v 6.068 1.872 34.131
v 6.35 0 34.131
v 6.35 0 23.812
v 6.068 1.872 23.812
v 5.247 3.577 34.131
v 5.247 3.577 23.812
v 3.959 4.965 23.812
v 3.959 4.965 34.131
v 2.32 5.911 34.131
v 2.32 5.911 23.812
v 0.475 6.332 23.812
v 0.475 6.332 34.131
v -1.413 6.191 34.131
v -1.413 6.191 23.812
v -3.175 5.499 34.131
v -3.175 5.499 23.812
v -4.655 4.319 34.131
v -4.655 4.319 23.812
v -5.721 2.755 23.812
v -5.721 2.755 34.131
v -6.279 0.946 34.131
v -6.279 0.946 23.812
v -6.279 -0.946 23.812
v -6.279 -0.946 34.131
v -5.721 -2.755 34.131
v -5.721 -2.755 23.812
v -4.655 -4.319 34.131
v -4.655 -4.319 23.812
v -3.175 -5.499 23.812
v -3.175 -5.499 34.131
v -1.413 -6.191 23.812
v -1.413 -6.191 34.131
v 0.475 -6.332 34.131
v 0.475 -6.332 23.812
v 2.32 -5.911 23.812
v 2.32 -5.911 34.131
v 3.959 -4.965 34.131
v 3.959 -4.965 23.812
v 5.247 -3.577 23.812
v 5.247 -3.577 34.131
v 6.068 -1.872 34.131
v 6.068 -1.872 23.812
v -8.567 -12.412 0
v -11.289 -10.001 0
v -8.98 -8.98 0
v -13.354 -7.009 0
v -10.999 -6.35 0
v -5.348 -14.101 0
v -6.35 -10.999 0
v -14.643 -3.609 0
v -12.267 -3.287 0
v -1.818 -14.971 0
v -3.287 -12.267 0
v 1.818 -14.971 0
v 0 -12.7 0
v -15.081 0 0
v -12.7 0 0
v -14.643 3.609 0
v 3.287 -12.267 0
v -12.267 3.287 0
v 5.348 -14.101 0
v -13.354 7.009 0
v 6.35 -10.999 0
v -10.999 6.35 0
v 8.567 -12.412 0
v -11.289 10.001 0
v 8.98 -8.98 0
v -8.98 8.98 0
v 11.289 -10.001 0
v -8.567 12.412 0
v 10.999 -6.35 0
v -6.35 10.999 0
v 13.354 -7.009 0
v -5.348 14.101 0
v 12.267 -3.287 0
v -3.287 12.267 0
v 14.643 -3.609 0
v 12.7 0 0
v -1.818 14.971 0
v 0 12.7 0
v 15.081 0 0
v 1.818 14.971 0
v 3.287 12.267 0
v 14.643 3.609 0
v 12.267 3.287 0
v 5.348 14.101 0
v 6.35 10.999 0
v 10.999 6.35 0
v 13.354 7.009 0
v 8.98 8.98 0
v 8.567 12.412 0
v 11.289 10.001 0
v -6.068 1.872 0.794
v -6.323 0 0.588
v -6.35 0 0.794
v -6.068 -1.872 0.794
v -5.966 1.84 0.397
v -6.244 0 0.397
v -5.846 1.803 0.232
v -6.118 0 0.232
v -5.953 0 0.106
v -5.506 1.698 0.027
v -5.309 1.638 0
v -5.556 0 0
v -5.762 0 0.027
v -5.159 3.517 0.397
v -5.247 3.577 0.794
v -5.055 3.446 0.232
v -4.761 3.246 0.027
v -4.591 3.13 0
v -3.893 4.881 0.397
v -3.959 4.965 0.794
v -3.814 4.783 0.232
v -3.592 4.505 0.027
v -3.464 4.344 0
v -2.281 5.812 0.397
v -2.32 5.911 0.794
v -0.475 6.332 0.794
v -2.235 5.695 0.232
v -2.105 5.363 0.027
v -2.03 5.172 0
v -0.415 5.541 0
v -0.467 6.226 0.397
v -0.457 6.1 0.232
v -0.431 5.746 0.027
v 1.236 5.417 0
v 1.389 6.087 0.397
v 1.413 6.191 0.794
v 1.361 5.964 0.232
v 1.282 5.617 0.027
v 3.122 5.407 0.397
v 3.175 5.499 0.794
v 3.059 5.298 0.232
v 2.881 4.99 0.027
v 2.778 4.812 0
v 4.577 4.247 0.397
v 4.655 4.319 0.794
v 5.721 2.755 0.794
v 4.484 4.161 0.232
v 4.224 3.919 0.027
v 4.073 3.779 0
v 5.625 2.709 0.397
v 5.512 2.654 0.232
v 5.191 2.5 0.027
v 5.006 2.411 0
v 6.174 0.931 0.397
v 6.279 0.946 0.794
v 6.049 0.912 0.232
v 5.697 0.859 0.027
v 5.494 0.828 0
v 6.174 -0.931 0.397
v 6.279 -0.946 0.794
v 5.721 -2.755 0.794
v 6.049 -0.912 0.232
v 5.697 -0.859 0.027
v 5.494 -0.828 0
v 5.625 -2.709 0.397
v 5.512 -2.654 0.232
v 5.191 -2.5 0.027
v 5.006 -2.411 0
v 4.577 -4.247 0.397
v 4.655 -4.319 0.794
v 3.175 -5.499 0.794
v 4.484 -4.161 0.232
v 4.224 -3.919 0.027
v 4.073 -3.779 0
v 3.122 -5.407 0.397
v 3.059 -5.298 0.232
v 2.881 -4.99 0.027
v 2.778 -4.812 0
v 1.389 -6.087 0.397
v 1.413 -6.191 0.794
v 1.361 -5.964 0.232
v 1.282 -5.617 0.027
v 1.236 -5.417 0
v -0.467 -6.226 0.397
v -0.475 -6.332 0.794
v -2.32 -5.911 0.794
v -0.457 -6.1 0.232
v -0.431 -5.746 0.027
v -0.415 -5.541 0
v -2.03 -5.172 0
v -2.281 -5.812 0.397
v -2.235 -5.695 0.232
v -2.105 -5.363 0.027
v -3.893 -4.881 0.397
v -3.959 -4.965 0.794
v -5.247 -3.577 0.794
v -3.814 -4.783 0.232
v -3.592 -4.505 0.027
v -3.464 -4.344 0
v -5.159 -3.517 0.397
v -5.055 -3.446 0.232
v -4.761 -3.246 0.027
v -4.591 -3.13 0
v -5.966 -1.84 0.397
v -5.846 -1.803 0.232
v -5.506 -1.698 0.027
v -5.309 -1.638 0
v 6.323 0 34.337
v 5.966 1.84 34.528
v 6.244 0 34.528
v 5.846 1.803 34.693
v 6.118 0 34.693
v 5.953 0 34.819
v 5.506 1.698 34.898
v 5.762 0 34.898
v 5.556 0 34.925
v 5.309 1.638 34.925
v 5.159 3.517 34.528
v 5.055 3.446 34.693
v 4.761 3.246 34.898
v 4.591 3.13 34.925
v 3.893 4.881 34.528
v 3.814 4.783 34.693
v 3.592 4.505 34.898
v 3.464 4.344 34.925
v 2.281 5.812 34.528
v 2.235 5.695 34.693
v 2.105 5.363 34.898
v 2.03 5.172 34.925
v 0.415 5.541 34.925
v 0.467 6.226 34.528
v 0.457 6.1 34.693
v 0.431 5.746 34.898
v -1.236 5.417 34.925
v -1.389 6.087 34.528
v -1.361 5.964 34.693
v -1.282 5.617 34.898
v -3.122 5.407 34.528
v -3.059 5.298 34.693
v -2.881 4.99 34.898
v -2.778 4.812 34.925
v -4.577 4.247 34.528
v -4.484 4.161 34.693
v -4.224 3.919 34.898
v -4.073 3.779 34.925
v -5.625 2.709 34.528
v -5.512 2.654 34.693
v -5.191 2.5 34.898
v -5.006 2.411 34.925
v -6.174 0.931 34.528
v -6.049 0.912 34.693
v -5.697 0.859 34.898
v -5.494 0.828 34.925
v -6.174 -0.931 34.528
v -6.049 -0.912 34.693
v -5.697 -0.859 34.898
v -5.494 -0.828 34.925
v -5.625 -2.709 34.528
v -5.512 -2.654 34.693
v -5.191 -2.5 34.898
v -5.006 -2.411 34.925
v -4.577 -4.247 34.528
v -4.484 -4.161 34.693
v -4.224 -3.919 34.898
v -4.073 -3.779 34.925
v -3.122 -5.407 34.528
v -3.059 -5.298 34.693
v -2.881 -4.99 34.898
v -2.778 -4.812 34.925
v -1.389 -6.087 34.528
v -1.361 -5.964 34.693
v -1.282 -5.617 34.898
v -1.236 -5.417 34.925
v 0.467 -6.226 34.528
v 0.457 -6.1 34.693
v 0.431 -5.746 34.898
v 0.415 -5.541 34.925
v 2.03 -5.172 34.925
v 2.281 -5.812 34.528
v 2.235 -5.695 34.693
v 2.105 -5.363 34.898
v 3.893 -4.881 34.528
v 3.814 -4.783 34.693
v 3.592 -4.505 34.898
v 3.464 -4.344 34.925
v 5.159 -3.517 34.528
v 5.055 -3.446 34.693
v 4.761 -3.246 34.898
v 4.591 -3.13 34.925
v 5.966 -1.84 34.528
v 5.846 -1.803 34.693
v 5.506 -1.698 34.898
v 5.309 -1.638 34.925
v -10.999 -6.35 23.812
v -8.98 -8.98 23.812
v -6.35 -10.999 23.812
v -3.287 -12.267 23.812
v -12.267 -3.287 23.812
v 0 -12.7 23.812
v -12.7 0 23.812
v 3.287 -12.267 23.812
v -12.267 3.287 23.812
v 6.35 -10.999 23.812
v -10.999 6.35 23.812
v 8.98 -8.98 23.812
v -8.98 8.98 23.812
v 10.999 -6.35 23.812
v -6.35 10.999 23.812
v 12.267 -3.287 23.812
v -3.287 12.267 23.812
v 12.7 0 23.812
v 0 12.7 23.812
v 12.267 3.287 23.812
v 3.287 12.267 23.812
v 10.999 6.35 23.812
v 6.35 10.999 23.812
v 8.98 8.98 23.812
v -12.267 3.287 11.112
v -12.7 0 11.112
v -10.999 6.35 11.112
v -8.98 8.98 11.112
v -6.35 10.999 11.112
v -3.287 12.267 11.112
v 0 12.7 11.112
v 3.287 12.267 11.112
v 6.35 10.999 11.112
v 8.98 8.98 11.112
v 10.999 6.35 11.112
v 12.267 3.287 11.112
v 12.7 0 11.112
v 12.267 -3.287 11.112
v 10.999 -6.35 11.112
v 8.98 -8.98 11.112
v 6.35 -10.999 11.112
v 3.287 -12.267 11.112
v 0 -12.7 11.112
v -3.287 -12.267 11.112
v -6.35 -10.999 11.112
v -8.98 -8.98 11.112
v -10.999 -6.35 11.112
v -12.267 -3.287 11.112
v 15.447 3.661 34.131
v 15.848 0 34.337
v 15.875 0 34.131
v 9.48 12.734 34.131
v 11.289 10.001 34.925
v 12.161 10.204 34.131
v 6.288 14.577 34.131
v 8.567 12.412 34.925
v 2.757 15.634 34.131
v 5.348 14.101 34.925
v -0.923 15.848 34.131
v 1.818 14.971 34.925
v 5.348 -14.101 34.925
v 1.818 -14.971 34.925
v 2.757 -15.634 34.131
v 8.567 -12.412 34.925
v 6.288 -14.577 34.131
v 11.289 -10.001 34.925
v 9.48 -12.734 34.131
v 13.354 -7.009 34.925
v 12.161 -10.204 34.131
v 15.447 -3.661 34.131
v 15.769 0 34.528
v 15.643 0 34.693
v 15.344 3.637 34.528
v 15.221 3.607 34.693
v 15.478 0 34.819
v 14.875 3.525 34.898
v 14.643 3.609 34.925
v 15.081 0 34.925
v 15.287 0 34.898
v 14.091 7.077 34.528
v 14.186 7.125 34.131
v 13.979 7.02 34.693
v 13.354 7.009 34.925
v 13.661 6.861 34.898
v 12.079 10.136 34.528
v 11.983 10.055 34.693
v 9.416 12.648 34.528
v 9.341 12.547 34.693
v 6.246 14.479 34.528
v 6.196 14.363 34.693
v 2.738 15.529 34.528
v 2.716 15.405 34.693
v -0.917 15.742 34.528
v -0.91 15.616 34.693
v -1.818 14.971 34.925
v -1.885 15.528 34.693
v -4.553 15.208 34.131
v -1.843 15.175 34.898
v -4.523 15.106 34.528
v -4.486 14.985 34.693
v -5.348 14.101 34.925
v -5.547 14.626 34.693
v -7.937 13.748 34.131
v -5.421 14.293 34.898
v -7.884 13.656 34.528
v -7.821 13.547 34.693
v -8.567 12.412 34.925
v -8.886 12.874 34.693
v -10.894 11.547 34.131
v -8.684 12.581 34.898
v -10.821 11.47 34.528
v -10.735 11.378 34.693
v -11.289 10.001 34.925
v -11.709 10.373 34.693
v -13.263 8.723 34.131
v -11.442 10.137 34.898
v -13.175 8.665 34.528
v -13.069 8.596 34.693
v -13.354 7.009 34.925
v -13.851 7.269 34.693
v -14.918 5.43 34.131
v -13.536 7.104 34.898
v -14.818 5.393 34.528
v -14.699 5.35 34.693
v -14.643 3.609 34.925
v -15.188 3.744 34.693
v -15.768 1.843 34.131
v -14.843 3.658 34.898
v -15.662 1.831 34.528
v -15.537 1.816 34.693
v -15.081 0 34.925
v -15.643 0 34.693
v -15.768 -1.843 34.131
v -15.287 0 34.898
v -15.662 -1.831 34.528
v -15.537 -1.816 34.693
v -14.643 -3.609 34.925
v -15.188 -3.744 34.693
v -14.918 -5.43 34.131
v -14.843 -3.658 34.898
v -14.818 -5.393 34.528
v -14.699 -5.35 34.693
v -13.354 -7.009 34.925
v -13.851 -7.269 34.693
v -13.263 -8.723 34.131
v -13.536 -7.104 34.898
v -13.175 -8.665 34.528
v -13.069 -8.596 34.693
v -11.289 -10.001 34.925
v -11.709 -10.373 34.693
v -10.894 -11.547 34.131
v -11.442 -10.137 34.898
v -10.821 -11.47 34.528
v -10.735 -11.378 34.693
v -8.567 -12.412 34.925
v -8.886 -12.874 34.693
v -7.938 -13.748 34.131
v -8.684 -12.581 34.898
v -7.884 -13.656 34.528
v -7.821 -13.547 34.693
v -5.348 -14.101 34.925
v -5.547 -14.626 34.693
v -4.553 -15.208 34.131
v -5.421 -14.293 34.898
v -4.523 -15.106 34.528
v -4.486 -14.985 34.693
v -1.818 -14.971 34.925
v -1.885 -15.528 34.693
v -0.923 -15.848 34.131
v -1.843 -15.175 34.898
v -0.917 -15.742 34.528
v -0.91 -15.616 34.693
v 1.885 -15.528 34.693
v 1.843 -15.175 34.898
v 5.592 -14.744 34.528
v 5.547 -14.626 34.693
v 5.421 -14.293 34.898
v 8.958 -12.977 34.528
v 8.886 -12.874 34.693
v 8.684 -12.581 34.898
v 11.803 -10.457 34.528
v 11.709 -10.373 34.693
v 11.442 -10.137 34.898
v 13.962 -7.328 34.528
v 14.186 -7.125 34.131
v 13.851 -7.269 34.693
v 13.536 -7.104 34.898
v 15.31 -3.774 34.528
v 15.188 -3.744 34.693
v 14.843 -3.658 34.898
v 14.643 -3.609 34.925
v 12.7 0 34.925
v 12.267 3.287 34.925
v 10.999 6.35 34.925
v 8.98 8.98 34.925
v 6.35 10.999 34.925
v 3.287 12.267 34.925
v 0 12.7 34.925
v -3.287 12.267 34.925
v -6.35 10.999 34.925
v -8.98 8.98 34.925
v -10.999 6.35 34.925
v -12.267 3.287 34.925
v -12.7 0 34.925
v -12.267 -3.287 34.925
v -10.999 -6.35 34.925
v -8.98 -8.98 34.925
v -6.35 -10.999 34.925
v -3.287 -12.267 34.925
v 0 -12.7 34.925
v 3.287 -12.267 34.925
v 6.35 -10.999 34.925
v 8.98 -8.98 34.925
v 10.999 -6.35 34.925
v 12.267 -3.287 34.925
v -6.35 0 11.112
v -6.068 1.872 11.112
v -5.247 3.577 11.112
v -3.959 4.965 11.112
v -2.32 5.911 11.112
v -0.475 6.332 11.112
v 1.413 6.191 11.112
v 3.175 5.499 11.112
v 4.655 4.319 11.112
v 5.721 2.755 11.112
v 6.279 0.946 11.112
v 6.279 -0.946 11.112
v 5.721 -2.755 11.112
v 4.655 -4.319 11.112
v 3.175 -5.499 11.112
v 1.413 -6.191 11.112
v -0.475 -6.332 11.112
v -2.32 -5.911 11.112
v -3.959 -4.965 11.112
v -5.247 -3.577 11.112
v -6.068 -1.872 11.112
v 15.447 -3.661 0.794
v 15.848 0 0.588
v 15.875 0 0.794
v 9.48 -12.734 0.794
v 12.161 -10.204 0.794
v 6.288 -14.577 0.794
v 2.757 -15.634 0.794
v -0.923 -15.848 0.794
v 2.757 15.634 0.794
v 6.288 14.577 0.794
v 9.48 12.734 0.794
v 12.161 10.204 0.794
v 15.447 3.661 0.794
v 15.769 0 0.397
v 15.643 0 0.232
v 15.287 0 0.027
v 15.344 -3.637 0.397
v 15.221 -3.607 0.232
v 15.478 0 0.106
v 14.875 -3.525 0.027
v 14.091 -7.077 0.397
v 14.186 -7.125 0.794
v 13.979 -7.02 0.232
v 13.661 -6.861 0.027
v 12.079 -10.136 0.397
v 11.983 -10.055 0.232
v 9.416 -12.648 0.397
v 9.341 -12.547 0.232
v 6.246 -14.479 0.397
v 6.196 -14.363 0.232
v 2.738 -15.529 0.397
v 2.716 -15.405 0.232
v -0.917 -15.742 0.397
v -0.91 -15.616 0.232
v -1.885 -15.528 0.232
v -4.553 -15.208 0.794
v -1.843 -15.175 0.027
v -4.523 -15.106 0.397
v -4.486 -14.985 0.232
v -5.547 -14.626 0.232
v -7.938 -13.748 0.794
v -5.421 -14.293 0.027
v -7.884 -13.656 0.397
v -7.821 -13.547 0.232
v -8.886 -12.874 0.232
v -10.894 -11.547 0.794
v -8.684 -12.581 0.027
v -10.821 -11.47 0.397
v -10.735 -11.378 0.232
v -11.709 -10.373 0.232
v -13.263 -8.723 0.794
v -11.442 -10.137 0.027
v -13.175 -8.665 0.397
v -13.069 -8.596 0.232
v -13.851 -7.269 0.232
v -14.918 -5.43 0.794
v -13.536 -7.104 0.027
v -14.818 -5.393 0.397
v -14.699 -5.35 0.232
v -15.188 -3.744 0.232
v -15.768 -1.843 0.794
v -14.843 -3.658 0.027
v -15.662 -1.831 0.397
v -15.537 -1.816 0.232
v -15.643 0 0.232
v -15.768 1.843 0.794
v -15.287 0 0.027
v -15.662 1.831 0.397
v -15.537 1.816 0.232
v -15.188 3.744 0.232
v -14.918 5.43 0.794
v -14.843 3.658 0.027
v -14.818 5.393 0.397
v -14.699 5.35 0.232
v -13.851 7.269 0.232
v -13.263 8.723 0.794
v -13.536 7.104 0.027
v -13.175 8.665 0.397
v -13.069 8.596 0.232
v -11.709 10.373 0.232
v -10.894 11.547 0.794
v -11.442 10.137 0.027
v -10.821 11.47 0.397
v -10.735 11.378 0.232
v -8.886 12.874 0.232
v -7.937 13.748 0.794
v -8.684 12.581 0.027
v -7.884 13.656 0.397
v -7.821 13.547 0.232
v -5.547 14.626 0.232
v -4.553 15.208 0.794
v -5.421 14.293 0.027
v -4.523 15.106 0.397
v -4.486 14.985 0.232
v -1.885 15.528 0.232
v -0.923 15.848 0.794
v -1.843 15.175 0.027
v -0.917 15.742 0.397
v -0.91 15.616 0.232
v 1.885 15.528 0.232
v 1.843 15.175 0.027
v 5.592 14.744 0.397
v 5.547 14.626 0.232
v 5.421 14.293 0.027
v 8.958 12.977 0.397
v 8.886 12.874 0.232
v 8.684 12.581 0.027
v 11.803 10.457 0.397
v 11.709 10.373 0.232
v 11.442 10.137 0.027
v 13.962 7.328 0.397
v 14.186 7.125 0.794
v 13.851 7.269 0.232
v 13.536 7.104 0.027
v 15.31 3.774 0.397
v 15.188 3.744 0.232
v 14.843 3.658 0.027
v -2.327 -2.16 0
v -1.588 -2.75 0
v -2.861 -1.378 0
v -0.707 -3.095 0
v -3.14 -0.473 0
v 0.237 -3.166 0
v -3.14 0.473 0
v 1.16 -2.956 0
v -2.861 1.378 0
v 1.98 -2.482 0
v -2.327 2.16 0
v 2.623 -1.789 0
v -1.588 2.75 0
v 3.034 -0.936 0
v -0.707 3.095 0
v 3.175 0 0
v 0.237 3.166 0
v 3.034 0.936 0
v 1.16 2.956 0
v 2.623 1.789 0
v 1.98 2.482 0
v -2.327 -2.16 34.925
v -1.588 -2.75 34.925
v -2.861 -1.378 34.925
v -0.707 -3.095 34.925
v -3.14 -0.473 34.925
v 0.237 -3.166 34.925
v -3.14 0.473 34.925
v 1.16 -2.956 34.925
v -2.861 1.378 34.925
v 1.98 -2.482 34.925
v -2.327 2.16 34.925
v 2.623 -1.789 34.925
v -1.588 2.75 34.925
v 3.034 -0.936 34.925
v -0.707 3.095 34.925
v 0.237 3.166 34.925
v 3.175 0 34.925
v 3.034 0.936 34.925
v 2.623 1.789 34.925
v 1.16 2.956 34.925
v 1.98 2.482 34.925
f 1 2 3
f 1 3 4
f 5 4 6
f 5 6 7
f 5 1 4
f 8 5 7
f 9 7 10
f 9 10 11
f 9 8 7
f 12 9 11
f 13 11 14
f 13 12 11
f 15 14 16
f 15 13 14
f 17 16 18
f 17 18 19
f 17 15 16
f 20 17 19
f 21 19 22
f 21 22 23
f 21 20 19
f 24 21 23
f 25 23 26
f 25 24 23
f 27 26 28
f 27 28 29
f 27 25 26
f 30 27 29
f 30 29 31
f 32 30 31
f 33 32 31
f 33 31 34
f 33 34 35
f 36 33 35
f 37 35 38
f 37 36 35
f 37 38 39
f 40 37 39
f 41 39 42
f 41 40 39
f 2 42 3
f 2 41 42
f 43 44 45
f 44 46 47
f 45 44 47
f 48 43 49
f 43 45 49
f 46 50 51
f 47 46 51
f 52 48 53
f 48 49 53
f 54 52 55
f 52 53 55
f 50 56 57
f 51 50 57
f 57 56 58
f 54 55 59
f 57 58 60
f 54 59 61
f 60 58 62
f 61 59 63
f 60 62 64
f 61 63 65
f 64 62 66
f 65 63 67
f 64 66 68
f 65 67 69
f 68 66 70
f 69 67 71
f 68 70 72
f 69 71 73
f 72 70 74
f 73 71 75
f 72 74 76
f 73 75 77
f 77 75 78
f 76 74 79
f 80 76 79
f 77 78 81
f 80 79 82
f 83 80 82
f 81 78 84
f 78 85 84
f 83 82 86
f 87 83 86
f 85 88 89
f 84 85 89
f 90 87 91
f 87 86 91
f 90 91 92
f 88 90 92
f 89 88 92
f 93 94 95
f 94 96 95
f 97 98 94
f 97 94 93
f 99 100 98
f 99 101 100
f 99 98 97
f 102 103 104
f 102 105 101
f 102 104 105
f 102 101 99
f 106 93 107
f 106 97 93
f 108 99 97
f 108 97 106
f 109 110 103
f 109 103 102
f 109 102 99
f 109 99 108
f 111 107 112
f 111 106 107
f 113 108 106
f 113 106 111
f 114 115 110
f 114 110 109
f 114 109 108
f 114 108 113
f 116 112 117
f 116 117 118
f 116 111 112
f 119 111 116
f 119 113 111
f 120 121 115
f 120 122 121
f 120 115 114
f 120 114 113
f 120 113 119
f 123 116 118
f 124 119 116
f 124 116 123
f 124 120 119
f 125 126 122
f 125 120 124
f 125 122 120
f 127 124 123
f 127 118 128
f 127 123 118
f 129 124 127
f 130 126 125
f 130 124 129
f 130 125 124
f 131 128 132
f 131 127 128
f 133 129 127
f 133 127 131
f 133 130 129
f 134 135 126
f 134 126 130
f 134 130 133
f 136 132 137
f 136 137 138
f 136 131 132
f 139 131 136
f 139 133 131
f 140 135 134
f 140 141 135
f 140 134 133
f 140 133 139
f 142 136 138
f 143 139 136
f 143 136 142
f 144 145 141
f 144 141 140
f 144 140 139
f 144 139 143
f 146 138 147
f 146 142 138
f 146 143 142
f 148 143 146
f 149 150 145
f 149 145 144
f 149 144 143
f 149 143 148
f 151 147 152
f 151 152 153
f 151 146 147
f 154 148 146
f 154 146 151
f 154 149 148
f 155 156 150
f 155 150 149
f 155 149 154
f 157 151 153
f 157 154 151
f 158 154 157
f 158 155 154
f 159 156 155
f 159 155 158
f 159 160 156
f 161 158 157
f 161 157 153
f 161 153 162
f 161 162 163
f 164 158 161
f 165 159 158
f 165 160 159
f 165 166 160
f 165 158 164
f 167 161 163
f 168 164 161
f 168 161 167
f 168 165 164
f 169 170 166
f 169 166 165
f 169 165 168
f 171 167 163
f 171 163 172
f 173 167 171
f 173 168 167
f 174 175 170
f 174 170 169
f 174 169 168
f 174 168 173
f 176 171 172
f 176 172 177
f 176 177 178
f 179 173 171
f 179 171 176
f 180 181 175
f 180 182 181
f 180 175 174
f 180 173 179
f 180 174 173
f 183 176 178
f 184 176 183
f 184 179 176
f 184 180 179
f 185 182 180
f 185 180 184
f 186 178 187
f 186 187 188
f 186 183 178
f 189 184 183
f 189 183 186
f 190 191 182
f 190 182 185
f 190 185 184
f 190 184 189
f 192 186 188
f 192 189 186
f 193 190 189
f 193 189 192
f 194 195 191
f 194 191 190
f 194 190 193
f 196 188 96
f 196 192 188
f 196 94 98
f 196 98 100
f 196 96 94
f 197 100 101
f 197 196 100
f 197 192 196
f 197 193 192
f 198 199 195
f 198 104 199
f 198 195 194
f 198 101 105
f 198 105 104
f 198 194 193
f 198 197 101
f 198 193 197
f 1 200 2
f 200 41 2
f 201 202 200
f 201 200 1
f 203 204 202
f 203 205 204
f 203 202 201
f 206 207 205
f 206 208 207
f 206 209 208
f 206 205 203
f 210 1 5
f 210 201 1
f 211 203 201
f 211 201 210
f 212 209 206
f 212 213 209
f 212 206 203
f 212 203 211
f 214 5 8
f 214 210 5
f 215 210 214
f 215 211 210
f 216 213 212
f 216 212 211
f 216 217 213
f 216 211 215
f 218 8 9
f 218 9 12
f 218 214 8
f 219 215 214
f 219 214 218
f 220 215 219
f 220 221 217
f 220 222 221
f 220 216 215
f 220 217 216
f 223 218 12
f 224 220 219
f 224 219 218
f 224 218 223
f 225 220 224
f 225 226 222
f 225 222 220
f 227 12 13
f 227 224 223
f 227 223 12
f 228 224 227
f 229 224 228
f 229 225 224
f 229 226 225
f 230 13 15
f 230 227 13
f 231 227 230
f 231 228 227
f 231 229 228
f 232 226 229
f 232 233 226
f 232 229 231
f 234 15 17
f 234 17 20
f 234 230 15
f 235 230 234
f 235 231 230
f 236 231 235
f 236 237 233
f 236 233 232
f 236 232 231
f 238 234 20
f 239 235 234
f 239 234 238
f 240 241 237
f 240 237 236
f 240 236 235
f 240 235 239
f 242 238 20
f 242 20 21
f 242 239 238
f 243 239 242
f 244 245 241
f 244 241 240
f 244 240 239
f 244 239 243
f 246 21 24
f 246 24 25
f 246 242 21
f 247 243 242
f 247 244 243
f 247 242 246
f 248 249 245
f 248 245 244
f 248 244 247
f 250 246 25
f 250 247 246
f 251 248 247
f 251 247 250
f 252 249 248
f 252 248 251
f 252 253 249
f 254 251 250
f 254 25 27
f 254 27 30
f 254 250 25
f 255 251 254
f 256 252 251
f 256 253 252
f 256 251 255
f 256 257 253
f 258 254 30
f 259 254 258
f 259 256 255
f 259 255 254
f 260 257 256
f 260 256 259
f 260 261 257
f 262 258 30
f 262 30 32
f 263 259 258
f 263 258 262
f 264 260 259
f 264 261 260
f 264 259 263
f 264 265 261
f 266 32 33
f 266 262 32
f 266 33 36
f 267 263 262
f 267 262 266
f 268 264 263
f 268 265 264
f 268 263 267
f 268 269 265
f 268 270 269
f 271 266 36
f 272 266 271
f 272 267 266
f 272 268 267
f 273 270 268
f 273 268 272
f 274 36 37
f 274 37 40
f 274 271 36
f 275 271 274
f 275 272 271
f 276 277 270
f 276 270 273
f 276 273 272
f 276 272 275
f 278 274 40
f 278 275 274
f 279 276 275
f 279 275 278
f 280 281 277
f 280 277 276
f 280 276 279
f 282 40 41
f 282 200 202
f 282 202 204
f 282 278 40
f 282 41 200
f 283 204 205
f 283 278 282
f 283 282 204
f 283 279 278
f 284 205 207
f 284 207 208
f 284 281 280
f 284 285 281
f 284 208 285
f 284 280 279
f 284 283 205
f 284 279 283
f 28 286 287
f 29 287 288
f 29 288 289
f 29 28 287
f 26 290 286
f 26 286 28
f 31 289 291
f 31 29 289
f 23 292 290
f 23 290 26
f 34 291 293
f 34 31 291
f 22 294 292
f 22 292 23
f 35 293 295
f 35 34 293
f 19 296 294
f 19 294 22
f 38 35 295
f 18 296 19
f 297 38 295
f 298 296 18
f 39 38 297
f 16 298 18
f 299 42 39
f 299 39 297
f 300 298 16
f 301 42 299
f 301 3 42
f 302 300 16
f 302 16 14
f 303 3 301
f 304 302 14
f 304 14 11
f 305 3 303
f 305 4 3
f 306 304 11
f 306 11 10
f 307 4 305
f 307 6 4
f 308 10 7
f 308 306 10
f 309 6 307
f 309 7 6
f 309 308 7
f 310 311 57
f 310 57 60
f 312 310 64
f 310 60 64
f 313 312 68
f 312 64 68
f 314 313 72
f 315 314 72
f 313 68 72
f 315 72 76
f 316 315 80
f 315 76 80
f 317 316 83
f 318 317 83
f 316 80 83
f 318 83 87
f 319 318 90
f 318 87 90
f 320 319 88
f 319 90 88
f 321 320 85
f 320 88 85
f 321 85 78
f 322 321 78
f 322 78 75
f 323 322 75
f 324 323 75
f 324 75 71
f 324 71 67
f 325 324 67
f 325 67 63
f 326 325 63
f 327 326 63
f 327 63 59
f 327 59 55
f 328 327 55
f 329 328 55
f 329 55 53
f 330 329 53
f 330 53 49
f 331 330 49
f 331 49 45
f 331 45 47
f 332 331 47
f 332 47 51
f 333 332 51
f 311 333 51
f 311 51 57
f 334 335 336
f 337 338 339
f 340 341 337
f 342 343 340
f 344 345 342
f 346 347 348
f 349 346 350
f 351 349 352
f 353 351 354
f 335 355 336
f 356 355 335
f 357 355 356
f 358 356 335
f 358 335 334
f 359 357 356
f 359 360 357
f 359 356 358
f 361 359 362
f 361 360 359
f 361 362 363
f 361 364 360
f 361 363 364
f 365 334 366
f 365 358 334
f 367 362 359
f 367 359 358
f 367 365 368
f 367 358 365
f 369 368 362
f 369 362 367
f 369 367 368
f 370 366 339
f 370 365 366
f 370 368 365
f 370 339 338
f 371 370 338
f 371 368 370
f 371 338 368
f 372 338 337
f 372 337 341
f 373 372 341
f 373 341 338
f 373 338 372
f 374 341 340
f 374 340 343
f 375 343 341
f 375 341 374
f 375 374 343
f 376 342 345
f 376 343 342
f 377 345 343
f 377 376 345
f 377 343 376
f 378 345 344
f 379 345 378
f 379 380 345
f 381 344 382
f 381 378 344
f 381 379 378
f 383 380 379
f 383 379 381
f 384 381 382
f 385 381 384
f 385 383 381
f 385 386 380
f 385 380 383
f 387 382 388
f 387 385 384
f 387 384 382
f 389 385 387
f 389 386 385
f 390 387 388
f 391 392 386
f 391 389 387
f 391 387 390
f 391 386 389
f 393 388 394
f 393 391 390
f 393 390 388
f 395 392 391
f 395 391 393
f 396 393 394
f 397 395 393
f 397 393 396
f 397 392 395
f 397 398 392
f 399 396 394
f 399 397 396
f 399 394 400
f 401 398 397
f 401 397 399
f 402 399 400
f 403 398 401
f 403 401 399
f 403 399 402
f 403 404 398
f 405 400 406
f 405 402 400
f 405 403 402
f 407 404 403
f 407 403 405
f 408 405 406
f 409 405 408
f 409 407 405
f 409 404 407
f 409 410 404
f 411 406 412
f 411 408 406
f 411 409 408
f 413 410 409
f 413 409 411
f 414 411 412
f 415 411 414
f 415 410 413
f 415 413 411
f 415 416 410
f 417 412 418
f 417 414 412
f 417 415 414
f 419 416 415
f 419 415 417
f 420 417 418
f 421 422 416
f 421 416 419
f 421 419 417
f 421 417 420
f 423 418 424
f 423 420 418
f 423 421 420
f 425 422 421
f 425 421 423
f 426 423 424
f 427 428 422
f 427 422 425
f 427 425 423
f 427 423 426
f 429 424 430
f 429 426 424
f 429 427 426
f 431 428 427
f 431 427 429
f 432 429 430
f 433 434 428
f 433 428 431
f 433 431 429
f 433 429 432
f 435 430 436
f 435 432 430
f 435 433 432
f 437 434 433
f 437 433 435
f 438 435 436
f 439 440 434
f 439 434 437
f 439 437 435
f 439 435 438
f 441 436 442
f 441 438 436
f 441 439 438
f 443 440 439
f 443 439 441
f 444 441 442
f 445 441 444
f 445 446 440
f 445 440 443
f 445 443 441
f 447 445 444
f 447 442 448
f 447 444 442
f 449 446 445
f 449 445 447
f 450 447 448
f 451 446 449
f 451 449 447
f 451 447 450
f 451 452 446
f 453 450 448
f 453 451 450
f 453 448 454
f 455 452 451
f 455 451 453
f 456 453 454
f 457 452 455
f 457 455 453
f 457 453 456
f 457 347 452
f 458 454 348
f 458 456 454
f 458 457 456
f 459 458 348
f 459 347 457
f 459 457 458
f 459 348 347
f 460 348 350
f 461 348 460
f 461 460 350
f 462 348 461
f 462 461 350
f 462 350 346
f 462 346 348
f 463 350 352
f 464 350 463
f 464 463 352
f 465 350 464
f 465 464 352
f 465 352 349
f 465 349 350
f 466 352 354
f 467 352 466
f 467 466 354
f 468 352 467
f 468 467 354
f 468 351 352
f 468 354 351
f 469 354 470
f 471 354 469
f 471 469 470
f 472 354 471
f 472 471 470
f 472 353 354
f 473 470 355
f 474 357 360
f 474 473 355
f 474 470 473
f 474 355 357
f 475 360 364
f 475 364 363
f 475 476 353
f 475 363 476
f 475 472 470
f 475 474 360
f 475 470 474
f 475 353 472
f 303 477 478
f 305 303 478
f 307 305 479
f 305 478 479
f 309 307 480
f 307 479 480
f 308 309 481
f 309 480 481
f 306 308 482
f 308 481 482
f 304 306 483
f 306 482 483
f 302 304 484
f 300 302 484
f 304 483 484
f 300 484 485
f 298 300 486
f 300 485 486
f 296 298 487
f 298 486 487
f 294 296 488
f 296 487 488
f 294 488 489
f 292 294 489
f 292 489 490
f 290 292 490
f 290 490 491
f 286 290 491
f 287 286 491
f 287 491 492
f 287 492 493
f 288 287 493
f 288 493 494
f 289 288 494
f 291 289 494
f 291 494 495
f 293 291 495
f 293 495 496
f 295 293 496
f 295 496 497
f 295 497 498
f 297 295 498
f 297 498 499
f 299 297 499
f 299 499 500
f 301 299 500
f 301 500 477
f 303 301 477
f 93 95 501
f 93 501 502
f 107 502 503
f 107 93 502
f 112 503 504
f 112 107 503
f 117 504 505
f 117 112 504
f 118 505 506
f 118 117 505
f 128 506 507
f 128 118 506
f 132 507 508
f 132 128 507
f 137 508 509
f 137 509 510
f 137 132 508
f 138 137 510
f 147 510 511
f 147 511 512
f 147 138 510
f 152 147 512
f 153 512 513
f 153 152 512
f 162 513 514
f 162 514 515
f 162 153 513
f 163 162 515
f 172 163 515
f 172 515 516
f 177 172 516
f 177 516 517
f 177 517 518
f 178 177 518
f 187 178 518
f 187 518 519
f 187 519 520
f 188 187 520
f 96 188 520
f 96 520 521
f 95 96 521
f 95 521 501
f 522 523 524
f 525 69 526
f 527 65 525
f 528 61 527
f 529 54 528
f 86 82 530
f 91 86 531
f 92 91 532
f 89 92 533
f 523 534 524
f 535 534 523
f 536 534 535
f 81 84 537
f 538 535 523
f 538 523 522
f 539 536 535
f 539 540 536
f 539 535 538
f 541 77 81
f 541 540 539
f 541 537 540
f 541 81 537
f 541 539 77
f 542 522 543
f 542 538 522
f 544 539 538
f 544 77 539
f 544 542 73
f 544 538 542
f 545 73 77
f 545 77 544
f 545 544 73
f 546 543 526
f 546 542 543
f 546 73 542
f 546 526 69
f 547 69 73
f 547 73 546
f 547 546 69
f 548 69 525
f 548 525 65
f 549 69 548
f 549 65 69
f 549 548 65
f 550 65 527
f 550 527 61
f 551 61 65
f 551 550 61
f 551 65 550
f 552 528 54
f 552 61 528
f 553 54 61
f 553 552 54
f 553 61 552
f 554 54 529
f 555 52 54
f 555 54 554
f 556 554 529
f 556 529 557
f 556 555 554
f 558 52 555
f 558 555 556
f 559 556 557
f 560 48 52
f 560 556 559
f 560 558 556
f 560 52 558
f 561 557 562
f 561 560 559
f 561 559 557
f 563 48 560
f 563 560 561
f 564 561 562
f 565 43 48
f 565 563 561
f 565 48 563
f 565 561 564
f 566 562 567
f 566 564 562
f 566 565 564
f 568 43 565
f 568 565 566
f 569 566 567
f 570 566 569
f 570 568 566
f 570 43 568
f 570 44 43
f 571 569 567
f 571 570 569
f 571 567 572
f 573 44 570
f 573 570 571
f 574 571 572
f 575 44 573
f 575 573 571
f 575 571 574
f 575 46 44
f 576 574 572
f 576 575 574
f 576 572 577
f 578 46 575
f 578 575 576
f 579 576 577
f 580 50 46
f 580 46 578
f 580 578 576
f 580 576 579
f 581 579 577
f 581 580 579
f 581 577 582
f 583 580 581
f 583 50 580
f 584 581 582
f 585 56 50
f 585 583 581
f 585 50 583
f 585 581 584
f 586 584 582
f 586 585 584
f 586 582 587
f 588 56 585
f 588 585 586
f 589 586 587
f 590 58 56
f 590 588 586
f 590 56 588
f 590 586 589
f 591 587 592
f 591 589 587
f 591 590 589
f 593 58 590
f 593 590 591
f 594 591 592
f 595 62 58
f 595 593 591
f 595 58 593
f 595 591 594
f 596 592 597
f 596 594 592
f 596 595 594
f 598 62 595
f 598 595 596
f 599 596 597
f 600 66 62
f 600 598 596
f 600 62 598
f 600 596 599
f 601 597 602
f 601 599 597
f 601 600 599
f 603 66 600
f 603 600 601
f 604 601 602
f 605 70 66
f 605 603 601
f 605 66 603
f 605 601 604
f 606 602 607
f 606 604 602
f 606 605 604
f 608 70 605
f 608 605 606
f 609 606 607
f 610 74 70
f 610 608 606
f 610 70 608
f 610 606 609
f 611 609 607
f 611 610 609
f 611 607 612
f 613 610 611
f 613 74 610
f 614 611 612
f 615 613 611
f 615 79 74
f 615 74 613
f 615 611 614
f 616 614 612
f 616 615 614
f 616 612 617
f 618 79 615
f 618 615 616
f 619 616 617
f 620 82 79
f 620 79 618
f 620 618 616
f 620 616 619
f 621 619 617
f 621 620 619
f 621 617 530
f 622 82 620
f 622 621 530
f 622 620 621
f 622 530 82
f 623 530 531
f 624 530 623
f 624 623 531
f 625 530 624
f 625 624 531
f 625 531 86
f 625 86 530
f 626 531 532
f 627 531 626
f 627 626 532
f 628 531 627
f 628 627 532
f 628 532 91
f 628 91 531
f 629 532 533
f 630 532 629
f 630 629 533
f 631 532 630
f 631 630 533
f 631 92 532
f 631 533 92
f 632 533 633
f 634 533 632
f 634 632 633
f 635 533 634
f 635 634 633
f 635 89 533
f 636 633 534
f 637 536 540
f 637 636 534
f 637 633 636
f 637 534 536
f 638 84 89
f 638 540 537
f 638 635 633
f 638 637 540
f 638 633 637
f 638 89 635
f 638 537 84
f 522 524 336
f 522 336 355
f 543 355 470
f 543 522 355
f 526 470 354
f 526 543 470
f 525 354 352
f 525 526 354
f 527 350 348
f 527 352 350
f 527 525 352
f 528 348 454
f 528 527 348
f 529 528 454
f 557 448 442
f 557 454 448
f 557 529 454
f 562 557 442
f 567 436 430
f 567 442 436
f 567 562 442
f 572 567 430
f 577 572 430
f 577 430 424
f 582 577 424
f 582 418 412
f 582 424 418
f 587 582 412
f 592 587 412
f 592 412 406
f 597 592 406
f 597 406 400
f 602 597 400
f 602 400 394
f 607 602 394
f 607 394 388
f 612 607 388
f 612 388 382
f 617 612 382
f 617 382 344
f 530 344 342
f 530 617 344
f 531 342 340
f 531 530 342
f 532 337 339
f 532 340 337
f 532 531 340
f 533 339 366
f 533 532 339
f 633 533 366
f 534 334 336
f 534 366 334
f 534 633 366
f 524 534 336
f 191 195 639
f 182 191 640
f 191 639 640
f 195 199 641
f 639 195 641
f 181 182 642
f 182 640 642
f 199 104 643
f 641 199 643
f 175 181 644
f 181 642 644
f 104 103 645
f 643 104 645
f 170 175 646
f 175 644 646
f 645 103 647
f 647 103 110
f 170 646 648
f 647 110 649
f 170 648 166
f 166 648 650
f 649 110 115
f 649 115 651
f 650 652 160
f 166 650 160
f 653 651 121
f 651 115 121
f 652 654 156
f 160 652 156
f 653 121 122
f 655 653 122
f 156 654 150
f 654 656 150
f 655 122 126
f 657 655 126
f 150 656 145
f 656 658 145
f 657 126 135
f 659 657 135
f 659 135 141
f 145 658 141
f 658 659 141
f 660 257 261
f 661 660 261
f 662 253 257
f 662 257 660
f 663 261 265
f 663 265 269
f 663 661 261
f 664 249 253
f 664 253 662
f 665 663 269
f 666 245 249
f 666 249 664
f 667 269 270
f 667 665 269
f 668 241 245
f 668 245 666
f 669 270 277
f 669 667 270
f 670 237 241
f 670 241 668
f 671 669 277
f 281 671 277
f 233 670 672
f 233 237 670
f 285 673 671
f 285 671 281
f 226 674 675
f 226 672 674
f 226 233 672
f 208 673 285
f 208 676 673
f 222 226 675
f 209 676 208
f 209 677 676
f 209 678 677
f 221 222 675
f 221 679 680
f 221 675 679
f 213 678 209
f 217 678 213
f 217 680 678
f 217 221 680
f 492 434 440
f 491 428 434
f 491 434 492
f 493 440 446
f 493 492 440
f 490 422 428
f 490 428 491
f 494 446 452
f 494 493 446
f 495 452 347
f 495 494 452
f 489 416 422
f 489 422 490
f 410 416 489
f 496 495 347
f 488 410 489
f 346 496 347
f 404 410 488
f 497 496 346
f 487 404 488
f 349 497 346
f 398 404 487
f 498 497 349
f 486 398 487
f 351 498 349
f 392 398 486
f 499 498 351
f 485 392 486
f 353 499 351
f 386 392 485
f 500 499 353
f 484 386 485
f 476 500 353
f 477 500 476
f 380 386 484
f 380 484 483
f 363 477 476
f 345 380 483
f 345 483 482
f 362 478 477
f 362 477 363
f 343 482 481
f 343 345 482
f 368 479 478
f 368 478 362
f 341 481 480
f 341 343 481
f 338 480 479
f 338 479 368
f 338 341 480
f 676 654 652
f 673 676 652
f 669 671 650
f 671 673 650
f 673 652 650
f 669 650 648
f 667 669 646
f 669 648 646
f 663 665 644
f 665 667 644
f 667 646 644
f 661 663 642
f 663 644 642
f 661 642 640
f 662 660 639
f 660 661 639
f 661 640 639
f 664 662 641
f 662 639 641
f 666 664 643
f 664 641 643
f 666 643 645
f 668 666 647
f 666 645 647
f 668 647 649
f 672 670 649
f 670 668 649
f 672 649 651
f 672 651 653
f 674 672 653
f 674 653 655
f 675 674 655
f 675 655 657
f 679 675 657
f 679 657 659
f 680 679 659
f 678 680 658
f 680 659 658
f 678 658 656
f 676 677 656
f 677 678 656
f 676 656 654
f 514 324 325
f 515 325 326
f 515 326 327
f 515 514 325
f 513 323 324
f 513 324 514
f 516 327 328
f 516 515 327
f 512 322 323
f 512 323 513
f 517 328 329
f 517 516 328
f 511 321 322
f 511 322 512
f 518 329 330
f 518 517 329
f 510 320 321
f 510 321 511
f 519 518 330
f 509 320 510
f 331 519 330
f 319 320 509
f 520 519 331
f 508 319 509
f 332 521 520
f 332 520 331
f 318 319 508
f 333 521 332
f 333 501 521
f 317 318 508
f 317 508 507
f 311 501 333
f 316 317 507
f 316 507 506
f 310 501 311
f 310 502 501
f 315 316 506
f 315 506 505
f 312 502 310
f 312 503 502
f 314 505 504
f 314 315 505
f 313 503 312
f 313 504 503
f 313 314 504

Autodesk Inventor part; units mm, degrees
ref_plane "YZ Plane" through (0, 0, 0) normal (1, 0, 0) x (0, 1, 0)
ref_plane "XZ Plane" through (0, 0, 0) normal (0, 1, 0) x (-1, 0, 0)
ref_plane "XY Plane" through (0, 0, 0) normal (0, 0, 1) x (1, 0, 0)
sketch "Sketch1" plane through (0, 0, 0) normal (0, 0, 1) x (1, 0, 0)
  circle A0 centre (0, 0) radius 15.875
  circle A1 centre (0, 0) radius 3.175
  dimension "d0" = 31.75
  dimension "d1" = 6.35
extrude "Extrusion1" add sketch "Sketch1" along normal blind 34.925
sketch "Sketch2" plane through (0, 0, 34.925) normal (0, 0, 1) x (1, 0, 0)
  circle A0 centre (0, 0) radius 15.875 projected
  circle A1 centre (0, 0) radius 6.35
  circle A2 centre (0, 0) radius 12.7
  dimension "d4" = 6.35
  dimension "d5" = 12.7
extrude "Extrusion2" cut sketch "Sketch2" against normal blind 11.1125 contours A2
sketch "Sketch3" plane through (0, 0, 0) normal (0, 0, -1) x (-1, 0, 0)
  circle A0 centre (0, 0) radius 15.875 projected
  circle A1 centre (0, 0) radius 6.35
  circle A2 centre (0, 0) radius 12.7
  dimension "d8" = 12.7
  dimension "d9" = 6.35
extrude "Extrusion3" cut sketch "Sketch3" against normal blind 11.1125 contours A2
fillet "Fillet1" radius 0.7937 4 edges at (6.35, 0, 0) (-15.875, 0, 0) (-6.35, 0, 34.925) (-15.875, 0, 34.925)
properties part number "Conveyor_Roller_MainOuter" material "PVC-Piping"
